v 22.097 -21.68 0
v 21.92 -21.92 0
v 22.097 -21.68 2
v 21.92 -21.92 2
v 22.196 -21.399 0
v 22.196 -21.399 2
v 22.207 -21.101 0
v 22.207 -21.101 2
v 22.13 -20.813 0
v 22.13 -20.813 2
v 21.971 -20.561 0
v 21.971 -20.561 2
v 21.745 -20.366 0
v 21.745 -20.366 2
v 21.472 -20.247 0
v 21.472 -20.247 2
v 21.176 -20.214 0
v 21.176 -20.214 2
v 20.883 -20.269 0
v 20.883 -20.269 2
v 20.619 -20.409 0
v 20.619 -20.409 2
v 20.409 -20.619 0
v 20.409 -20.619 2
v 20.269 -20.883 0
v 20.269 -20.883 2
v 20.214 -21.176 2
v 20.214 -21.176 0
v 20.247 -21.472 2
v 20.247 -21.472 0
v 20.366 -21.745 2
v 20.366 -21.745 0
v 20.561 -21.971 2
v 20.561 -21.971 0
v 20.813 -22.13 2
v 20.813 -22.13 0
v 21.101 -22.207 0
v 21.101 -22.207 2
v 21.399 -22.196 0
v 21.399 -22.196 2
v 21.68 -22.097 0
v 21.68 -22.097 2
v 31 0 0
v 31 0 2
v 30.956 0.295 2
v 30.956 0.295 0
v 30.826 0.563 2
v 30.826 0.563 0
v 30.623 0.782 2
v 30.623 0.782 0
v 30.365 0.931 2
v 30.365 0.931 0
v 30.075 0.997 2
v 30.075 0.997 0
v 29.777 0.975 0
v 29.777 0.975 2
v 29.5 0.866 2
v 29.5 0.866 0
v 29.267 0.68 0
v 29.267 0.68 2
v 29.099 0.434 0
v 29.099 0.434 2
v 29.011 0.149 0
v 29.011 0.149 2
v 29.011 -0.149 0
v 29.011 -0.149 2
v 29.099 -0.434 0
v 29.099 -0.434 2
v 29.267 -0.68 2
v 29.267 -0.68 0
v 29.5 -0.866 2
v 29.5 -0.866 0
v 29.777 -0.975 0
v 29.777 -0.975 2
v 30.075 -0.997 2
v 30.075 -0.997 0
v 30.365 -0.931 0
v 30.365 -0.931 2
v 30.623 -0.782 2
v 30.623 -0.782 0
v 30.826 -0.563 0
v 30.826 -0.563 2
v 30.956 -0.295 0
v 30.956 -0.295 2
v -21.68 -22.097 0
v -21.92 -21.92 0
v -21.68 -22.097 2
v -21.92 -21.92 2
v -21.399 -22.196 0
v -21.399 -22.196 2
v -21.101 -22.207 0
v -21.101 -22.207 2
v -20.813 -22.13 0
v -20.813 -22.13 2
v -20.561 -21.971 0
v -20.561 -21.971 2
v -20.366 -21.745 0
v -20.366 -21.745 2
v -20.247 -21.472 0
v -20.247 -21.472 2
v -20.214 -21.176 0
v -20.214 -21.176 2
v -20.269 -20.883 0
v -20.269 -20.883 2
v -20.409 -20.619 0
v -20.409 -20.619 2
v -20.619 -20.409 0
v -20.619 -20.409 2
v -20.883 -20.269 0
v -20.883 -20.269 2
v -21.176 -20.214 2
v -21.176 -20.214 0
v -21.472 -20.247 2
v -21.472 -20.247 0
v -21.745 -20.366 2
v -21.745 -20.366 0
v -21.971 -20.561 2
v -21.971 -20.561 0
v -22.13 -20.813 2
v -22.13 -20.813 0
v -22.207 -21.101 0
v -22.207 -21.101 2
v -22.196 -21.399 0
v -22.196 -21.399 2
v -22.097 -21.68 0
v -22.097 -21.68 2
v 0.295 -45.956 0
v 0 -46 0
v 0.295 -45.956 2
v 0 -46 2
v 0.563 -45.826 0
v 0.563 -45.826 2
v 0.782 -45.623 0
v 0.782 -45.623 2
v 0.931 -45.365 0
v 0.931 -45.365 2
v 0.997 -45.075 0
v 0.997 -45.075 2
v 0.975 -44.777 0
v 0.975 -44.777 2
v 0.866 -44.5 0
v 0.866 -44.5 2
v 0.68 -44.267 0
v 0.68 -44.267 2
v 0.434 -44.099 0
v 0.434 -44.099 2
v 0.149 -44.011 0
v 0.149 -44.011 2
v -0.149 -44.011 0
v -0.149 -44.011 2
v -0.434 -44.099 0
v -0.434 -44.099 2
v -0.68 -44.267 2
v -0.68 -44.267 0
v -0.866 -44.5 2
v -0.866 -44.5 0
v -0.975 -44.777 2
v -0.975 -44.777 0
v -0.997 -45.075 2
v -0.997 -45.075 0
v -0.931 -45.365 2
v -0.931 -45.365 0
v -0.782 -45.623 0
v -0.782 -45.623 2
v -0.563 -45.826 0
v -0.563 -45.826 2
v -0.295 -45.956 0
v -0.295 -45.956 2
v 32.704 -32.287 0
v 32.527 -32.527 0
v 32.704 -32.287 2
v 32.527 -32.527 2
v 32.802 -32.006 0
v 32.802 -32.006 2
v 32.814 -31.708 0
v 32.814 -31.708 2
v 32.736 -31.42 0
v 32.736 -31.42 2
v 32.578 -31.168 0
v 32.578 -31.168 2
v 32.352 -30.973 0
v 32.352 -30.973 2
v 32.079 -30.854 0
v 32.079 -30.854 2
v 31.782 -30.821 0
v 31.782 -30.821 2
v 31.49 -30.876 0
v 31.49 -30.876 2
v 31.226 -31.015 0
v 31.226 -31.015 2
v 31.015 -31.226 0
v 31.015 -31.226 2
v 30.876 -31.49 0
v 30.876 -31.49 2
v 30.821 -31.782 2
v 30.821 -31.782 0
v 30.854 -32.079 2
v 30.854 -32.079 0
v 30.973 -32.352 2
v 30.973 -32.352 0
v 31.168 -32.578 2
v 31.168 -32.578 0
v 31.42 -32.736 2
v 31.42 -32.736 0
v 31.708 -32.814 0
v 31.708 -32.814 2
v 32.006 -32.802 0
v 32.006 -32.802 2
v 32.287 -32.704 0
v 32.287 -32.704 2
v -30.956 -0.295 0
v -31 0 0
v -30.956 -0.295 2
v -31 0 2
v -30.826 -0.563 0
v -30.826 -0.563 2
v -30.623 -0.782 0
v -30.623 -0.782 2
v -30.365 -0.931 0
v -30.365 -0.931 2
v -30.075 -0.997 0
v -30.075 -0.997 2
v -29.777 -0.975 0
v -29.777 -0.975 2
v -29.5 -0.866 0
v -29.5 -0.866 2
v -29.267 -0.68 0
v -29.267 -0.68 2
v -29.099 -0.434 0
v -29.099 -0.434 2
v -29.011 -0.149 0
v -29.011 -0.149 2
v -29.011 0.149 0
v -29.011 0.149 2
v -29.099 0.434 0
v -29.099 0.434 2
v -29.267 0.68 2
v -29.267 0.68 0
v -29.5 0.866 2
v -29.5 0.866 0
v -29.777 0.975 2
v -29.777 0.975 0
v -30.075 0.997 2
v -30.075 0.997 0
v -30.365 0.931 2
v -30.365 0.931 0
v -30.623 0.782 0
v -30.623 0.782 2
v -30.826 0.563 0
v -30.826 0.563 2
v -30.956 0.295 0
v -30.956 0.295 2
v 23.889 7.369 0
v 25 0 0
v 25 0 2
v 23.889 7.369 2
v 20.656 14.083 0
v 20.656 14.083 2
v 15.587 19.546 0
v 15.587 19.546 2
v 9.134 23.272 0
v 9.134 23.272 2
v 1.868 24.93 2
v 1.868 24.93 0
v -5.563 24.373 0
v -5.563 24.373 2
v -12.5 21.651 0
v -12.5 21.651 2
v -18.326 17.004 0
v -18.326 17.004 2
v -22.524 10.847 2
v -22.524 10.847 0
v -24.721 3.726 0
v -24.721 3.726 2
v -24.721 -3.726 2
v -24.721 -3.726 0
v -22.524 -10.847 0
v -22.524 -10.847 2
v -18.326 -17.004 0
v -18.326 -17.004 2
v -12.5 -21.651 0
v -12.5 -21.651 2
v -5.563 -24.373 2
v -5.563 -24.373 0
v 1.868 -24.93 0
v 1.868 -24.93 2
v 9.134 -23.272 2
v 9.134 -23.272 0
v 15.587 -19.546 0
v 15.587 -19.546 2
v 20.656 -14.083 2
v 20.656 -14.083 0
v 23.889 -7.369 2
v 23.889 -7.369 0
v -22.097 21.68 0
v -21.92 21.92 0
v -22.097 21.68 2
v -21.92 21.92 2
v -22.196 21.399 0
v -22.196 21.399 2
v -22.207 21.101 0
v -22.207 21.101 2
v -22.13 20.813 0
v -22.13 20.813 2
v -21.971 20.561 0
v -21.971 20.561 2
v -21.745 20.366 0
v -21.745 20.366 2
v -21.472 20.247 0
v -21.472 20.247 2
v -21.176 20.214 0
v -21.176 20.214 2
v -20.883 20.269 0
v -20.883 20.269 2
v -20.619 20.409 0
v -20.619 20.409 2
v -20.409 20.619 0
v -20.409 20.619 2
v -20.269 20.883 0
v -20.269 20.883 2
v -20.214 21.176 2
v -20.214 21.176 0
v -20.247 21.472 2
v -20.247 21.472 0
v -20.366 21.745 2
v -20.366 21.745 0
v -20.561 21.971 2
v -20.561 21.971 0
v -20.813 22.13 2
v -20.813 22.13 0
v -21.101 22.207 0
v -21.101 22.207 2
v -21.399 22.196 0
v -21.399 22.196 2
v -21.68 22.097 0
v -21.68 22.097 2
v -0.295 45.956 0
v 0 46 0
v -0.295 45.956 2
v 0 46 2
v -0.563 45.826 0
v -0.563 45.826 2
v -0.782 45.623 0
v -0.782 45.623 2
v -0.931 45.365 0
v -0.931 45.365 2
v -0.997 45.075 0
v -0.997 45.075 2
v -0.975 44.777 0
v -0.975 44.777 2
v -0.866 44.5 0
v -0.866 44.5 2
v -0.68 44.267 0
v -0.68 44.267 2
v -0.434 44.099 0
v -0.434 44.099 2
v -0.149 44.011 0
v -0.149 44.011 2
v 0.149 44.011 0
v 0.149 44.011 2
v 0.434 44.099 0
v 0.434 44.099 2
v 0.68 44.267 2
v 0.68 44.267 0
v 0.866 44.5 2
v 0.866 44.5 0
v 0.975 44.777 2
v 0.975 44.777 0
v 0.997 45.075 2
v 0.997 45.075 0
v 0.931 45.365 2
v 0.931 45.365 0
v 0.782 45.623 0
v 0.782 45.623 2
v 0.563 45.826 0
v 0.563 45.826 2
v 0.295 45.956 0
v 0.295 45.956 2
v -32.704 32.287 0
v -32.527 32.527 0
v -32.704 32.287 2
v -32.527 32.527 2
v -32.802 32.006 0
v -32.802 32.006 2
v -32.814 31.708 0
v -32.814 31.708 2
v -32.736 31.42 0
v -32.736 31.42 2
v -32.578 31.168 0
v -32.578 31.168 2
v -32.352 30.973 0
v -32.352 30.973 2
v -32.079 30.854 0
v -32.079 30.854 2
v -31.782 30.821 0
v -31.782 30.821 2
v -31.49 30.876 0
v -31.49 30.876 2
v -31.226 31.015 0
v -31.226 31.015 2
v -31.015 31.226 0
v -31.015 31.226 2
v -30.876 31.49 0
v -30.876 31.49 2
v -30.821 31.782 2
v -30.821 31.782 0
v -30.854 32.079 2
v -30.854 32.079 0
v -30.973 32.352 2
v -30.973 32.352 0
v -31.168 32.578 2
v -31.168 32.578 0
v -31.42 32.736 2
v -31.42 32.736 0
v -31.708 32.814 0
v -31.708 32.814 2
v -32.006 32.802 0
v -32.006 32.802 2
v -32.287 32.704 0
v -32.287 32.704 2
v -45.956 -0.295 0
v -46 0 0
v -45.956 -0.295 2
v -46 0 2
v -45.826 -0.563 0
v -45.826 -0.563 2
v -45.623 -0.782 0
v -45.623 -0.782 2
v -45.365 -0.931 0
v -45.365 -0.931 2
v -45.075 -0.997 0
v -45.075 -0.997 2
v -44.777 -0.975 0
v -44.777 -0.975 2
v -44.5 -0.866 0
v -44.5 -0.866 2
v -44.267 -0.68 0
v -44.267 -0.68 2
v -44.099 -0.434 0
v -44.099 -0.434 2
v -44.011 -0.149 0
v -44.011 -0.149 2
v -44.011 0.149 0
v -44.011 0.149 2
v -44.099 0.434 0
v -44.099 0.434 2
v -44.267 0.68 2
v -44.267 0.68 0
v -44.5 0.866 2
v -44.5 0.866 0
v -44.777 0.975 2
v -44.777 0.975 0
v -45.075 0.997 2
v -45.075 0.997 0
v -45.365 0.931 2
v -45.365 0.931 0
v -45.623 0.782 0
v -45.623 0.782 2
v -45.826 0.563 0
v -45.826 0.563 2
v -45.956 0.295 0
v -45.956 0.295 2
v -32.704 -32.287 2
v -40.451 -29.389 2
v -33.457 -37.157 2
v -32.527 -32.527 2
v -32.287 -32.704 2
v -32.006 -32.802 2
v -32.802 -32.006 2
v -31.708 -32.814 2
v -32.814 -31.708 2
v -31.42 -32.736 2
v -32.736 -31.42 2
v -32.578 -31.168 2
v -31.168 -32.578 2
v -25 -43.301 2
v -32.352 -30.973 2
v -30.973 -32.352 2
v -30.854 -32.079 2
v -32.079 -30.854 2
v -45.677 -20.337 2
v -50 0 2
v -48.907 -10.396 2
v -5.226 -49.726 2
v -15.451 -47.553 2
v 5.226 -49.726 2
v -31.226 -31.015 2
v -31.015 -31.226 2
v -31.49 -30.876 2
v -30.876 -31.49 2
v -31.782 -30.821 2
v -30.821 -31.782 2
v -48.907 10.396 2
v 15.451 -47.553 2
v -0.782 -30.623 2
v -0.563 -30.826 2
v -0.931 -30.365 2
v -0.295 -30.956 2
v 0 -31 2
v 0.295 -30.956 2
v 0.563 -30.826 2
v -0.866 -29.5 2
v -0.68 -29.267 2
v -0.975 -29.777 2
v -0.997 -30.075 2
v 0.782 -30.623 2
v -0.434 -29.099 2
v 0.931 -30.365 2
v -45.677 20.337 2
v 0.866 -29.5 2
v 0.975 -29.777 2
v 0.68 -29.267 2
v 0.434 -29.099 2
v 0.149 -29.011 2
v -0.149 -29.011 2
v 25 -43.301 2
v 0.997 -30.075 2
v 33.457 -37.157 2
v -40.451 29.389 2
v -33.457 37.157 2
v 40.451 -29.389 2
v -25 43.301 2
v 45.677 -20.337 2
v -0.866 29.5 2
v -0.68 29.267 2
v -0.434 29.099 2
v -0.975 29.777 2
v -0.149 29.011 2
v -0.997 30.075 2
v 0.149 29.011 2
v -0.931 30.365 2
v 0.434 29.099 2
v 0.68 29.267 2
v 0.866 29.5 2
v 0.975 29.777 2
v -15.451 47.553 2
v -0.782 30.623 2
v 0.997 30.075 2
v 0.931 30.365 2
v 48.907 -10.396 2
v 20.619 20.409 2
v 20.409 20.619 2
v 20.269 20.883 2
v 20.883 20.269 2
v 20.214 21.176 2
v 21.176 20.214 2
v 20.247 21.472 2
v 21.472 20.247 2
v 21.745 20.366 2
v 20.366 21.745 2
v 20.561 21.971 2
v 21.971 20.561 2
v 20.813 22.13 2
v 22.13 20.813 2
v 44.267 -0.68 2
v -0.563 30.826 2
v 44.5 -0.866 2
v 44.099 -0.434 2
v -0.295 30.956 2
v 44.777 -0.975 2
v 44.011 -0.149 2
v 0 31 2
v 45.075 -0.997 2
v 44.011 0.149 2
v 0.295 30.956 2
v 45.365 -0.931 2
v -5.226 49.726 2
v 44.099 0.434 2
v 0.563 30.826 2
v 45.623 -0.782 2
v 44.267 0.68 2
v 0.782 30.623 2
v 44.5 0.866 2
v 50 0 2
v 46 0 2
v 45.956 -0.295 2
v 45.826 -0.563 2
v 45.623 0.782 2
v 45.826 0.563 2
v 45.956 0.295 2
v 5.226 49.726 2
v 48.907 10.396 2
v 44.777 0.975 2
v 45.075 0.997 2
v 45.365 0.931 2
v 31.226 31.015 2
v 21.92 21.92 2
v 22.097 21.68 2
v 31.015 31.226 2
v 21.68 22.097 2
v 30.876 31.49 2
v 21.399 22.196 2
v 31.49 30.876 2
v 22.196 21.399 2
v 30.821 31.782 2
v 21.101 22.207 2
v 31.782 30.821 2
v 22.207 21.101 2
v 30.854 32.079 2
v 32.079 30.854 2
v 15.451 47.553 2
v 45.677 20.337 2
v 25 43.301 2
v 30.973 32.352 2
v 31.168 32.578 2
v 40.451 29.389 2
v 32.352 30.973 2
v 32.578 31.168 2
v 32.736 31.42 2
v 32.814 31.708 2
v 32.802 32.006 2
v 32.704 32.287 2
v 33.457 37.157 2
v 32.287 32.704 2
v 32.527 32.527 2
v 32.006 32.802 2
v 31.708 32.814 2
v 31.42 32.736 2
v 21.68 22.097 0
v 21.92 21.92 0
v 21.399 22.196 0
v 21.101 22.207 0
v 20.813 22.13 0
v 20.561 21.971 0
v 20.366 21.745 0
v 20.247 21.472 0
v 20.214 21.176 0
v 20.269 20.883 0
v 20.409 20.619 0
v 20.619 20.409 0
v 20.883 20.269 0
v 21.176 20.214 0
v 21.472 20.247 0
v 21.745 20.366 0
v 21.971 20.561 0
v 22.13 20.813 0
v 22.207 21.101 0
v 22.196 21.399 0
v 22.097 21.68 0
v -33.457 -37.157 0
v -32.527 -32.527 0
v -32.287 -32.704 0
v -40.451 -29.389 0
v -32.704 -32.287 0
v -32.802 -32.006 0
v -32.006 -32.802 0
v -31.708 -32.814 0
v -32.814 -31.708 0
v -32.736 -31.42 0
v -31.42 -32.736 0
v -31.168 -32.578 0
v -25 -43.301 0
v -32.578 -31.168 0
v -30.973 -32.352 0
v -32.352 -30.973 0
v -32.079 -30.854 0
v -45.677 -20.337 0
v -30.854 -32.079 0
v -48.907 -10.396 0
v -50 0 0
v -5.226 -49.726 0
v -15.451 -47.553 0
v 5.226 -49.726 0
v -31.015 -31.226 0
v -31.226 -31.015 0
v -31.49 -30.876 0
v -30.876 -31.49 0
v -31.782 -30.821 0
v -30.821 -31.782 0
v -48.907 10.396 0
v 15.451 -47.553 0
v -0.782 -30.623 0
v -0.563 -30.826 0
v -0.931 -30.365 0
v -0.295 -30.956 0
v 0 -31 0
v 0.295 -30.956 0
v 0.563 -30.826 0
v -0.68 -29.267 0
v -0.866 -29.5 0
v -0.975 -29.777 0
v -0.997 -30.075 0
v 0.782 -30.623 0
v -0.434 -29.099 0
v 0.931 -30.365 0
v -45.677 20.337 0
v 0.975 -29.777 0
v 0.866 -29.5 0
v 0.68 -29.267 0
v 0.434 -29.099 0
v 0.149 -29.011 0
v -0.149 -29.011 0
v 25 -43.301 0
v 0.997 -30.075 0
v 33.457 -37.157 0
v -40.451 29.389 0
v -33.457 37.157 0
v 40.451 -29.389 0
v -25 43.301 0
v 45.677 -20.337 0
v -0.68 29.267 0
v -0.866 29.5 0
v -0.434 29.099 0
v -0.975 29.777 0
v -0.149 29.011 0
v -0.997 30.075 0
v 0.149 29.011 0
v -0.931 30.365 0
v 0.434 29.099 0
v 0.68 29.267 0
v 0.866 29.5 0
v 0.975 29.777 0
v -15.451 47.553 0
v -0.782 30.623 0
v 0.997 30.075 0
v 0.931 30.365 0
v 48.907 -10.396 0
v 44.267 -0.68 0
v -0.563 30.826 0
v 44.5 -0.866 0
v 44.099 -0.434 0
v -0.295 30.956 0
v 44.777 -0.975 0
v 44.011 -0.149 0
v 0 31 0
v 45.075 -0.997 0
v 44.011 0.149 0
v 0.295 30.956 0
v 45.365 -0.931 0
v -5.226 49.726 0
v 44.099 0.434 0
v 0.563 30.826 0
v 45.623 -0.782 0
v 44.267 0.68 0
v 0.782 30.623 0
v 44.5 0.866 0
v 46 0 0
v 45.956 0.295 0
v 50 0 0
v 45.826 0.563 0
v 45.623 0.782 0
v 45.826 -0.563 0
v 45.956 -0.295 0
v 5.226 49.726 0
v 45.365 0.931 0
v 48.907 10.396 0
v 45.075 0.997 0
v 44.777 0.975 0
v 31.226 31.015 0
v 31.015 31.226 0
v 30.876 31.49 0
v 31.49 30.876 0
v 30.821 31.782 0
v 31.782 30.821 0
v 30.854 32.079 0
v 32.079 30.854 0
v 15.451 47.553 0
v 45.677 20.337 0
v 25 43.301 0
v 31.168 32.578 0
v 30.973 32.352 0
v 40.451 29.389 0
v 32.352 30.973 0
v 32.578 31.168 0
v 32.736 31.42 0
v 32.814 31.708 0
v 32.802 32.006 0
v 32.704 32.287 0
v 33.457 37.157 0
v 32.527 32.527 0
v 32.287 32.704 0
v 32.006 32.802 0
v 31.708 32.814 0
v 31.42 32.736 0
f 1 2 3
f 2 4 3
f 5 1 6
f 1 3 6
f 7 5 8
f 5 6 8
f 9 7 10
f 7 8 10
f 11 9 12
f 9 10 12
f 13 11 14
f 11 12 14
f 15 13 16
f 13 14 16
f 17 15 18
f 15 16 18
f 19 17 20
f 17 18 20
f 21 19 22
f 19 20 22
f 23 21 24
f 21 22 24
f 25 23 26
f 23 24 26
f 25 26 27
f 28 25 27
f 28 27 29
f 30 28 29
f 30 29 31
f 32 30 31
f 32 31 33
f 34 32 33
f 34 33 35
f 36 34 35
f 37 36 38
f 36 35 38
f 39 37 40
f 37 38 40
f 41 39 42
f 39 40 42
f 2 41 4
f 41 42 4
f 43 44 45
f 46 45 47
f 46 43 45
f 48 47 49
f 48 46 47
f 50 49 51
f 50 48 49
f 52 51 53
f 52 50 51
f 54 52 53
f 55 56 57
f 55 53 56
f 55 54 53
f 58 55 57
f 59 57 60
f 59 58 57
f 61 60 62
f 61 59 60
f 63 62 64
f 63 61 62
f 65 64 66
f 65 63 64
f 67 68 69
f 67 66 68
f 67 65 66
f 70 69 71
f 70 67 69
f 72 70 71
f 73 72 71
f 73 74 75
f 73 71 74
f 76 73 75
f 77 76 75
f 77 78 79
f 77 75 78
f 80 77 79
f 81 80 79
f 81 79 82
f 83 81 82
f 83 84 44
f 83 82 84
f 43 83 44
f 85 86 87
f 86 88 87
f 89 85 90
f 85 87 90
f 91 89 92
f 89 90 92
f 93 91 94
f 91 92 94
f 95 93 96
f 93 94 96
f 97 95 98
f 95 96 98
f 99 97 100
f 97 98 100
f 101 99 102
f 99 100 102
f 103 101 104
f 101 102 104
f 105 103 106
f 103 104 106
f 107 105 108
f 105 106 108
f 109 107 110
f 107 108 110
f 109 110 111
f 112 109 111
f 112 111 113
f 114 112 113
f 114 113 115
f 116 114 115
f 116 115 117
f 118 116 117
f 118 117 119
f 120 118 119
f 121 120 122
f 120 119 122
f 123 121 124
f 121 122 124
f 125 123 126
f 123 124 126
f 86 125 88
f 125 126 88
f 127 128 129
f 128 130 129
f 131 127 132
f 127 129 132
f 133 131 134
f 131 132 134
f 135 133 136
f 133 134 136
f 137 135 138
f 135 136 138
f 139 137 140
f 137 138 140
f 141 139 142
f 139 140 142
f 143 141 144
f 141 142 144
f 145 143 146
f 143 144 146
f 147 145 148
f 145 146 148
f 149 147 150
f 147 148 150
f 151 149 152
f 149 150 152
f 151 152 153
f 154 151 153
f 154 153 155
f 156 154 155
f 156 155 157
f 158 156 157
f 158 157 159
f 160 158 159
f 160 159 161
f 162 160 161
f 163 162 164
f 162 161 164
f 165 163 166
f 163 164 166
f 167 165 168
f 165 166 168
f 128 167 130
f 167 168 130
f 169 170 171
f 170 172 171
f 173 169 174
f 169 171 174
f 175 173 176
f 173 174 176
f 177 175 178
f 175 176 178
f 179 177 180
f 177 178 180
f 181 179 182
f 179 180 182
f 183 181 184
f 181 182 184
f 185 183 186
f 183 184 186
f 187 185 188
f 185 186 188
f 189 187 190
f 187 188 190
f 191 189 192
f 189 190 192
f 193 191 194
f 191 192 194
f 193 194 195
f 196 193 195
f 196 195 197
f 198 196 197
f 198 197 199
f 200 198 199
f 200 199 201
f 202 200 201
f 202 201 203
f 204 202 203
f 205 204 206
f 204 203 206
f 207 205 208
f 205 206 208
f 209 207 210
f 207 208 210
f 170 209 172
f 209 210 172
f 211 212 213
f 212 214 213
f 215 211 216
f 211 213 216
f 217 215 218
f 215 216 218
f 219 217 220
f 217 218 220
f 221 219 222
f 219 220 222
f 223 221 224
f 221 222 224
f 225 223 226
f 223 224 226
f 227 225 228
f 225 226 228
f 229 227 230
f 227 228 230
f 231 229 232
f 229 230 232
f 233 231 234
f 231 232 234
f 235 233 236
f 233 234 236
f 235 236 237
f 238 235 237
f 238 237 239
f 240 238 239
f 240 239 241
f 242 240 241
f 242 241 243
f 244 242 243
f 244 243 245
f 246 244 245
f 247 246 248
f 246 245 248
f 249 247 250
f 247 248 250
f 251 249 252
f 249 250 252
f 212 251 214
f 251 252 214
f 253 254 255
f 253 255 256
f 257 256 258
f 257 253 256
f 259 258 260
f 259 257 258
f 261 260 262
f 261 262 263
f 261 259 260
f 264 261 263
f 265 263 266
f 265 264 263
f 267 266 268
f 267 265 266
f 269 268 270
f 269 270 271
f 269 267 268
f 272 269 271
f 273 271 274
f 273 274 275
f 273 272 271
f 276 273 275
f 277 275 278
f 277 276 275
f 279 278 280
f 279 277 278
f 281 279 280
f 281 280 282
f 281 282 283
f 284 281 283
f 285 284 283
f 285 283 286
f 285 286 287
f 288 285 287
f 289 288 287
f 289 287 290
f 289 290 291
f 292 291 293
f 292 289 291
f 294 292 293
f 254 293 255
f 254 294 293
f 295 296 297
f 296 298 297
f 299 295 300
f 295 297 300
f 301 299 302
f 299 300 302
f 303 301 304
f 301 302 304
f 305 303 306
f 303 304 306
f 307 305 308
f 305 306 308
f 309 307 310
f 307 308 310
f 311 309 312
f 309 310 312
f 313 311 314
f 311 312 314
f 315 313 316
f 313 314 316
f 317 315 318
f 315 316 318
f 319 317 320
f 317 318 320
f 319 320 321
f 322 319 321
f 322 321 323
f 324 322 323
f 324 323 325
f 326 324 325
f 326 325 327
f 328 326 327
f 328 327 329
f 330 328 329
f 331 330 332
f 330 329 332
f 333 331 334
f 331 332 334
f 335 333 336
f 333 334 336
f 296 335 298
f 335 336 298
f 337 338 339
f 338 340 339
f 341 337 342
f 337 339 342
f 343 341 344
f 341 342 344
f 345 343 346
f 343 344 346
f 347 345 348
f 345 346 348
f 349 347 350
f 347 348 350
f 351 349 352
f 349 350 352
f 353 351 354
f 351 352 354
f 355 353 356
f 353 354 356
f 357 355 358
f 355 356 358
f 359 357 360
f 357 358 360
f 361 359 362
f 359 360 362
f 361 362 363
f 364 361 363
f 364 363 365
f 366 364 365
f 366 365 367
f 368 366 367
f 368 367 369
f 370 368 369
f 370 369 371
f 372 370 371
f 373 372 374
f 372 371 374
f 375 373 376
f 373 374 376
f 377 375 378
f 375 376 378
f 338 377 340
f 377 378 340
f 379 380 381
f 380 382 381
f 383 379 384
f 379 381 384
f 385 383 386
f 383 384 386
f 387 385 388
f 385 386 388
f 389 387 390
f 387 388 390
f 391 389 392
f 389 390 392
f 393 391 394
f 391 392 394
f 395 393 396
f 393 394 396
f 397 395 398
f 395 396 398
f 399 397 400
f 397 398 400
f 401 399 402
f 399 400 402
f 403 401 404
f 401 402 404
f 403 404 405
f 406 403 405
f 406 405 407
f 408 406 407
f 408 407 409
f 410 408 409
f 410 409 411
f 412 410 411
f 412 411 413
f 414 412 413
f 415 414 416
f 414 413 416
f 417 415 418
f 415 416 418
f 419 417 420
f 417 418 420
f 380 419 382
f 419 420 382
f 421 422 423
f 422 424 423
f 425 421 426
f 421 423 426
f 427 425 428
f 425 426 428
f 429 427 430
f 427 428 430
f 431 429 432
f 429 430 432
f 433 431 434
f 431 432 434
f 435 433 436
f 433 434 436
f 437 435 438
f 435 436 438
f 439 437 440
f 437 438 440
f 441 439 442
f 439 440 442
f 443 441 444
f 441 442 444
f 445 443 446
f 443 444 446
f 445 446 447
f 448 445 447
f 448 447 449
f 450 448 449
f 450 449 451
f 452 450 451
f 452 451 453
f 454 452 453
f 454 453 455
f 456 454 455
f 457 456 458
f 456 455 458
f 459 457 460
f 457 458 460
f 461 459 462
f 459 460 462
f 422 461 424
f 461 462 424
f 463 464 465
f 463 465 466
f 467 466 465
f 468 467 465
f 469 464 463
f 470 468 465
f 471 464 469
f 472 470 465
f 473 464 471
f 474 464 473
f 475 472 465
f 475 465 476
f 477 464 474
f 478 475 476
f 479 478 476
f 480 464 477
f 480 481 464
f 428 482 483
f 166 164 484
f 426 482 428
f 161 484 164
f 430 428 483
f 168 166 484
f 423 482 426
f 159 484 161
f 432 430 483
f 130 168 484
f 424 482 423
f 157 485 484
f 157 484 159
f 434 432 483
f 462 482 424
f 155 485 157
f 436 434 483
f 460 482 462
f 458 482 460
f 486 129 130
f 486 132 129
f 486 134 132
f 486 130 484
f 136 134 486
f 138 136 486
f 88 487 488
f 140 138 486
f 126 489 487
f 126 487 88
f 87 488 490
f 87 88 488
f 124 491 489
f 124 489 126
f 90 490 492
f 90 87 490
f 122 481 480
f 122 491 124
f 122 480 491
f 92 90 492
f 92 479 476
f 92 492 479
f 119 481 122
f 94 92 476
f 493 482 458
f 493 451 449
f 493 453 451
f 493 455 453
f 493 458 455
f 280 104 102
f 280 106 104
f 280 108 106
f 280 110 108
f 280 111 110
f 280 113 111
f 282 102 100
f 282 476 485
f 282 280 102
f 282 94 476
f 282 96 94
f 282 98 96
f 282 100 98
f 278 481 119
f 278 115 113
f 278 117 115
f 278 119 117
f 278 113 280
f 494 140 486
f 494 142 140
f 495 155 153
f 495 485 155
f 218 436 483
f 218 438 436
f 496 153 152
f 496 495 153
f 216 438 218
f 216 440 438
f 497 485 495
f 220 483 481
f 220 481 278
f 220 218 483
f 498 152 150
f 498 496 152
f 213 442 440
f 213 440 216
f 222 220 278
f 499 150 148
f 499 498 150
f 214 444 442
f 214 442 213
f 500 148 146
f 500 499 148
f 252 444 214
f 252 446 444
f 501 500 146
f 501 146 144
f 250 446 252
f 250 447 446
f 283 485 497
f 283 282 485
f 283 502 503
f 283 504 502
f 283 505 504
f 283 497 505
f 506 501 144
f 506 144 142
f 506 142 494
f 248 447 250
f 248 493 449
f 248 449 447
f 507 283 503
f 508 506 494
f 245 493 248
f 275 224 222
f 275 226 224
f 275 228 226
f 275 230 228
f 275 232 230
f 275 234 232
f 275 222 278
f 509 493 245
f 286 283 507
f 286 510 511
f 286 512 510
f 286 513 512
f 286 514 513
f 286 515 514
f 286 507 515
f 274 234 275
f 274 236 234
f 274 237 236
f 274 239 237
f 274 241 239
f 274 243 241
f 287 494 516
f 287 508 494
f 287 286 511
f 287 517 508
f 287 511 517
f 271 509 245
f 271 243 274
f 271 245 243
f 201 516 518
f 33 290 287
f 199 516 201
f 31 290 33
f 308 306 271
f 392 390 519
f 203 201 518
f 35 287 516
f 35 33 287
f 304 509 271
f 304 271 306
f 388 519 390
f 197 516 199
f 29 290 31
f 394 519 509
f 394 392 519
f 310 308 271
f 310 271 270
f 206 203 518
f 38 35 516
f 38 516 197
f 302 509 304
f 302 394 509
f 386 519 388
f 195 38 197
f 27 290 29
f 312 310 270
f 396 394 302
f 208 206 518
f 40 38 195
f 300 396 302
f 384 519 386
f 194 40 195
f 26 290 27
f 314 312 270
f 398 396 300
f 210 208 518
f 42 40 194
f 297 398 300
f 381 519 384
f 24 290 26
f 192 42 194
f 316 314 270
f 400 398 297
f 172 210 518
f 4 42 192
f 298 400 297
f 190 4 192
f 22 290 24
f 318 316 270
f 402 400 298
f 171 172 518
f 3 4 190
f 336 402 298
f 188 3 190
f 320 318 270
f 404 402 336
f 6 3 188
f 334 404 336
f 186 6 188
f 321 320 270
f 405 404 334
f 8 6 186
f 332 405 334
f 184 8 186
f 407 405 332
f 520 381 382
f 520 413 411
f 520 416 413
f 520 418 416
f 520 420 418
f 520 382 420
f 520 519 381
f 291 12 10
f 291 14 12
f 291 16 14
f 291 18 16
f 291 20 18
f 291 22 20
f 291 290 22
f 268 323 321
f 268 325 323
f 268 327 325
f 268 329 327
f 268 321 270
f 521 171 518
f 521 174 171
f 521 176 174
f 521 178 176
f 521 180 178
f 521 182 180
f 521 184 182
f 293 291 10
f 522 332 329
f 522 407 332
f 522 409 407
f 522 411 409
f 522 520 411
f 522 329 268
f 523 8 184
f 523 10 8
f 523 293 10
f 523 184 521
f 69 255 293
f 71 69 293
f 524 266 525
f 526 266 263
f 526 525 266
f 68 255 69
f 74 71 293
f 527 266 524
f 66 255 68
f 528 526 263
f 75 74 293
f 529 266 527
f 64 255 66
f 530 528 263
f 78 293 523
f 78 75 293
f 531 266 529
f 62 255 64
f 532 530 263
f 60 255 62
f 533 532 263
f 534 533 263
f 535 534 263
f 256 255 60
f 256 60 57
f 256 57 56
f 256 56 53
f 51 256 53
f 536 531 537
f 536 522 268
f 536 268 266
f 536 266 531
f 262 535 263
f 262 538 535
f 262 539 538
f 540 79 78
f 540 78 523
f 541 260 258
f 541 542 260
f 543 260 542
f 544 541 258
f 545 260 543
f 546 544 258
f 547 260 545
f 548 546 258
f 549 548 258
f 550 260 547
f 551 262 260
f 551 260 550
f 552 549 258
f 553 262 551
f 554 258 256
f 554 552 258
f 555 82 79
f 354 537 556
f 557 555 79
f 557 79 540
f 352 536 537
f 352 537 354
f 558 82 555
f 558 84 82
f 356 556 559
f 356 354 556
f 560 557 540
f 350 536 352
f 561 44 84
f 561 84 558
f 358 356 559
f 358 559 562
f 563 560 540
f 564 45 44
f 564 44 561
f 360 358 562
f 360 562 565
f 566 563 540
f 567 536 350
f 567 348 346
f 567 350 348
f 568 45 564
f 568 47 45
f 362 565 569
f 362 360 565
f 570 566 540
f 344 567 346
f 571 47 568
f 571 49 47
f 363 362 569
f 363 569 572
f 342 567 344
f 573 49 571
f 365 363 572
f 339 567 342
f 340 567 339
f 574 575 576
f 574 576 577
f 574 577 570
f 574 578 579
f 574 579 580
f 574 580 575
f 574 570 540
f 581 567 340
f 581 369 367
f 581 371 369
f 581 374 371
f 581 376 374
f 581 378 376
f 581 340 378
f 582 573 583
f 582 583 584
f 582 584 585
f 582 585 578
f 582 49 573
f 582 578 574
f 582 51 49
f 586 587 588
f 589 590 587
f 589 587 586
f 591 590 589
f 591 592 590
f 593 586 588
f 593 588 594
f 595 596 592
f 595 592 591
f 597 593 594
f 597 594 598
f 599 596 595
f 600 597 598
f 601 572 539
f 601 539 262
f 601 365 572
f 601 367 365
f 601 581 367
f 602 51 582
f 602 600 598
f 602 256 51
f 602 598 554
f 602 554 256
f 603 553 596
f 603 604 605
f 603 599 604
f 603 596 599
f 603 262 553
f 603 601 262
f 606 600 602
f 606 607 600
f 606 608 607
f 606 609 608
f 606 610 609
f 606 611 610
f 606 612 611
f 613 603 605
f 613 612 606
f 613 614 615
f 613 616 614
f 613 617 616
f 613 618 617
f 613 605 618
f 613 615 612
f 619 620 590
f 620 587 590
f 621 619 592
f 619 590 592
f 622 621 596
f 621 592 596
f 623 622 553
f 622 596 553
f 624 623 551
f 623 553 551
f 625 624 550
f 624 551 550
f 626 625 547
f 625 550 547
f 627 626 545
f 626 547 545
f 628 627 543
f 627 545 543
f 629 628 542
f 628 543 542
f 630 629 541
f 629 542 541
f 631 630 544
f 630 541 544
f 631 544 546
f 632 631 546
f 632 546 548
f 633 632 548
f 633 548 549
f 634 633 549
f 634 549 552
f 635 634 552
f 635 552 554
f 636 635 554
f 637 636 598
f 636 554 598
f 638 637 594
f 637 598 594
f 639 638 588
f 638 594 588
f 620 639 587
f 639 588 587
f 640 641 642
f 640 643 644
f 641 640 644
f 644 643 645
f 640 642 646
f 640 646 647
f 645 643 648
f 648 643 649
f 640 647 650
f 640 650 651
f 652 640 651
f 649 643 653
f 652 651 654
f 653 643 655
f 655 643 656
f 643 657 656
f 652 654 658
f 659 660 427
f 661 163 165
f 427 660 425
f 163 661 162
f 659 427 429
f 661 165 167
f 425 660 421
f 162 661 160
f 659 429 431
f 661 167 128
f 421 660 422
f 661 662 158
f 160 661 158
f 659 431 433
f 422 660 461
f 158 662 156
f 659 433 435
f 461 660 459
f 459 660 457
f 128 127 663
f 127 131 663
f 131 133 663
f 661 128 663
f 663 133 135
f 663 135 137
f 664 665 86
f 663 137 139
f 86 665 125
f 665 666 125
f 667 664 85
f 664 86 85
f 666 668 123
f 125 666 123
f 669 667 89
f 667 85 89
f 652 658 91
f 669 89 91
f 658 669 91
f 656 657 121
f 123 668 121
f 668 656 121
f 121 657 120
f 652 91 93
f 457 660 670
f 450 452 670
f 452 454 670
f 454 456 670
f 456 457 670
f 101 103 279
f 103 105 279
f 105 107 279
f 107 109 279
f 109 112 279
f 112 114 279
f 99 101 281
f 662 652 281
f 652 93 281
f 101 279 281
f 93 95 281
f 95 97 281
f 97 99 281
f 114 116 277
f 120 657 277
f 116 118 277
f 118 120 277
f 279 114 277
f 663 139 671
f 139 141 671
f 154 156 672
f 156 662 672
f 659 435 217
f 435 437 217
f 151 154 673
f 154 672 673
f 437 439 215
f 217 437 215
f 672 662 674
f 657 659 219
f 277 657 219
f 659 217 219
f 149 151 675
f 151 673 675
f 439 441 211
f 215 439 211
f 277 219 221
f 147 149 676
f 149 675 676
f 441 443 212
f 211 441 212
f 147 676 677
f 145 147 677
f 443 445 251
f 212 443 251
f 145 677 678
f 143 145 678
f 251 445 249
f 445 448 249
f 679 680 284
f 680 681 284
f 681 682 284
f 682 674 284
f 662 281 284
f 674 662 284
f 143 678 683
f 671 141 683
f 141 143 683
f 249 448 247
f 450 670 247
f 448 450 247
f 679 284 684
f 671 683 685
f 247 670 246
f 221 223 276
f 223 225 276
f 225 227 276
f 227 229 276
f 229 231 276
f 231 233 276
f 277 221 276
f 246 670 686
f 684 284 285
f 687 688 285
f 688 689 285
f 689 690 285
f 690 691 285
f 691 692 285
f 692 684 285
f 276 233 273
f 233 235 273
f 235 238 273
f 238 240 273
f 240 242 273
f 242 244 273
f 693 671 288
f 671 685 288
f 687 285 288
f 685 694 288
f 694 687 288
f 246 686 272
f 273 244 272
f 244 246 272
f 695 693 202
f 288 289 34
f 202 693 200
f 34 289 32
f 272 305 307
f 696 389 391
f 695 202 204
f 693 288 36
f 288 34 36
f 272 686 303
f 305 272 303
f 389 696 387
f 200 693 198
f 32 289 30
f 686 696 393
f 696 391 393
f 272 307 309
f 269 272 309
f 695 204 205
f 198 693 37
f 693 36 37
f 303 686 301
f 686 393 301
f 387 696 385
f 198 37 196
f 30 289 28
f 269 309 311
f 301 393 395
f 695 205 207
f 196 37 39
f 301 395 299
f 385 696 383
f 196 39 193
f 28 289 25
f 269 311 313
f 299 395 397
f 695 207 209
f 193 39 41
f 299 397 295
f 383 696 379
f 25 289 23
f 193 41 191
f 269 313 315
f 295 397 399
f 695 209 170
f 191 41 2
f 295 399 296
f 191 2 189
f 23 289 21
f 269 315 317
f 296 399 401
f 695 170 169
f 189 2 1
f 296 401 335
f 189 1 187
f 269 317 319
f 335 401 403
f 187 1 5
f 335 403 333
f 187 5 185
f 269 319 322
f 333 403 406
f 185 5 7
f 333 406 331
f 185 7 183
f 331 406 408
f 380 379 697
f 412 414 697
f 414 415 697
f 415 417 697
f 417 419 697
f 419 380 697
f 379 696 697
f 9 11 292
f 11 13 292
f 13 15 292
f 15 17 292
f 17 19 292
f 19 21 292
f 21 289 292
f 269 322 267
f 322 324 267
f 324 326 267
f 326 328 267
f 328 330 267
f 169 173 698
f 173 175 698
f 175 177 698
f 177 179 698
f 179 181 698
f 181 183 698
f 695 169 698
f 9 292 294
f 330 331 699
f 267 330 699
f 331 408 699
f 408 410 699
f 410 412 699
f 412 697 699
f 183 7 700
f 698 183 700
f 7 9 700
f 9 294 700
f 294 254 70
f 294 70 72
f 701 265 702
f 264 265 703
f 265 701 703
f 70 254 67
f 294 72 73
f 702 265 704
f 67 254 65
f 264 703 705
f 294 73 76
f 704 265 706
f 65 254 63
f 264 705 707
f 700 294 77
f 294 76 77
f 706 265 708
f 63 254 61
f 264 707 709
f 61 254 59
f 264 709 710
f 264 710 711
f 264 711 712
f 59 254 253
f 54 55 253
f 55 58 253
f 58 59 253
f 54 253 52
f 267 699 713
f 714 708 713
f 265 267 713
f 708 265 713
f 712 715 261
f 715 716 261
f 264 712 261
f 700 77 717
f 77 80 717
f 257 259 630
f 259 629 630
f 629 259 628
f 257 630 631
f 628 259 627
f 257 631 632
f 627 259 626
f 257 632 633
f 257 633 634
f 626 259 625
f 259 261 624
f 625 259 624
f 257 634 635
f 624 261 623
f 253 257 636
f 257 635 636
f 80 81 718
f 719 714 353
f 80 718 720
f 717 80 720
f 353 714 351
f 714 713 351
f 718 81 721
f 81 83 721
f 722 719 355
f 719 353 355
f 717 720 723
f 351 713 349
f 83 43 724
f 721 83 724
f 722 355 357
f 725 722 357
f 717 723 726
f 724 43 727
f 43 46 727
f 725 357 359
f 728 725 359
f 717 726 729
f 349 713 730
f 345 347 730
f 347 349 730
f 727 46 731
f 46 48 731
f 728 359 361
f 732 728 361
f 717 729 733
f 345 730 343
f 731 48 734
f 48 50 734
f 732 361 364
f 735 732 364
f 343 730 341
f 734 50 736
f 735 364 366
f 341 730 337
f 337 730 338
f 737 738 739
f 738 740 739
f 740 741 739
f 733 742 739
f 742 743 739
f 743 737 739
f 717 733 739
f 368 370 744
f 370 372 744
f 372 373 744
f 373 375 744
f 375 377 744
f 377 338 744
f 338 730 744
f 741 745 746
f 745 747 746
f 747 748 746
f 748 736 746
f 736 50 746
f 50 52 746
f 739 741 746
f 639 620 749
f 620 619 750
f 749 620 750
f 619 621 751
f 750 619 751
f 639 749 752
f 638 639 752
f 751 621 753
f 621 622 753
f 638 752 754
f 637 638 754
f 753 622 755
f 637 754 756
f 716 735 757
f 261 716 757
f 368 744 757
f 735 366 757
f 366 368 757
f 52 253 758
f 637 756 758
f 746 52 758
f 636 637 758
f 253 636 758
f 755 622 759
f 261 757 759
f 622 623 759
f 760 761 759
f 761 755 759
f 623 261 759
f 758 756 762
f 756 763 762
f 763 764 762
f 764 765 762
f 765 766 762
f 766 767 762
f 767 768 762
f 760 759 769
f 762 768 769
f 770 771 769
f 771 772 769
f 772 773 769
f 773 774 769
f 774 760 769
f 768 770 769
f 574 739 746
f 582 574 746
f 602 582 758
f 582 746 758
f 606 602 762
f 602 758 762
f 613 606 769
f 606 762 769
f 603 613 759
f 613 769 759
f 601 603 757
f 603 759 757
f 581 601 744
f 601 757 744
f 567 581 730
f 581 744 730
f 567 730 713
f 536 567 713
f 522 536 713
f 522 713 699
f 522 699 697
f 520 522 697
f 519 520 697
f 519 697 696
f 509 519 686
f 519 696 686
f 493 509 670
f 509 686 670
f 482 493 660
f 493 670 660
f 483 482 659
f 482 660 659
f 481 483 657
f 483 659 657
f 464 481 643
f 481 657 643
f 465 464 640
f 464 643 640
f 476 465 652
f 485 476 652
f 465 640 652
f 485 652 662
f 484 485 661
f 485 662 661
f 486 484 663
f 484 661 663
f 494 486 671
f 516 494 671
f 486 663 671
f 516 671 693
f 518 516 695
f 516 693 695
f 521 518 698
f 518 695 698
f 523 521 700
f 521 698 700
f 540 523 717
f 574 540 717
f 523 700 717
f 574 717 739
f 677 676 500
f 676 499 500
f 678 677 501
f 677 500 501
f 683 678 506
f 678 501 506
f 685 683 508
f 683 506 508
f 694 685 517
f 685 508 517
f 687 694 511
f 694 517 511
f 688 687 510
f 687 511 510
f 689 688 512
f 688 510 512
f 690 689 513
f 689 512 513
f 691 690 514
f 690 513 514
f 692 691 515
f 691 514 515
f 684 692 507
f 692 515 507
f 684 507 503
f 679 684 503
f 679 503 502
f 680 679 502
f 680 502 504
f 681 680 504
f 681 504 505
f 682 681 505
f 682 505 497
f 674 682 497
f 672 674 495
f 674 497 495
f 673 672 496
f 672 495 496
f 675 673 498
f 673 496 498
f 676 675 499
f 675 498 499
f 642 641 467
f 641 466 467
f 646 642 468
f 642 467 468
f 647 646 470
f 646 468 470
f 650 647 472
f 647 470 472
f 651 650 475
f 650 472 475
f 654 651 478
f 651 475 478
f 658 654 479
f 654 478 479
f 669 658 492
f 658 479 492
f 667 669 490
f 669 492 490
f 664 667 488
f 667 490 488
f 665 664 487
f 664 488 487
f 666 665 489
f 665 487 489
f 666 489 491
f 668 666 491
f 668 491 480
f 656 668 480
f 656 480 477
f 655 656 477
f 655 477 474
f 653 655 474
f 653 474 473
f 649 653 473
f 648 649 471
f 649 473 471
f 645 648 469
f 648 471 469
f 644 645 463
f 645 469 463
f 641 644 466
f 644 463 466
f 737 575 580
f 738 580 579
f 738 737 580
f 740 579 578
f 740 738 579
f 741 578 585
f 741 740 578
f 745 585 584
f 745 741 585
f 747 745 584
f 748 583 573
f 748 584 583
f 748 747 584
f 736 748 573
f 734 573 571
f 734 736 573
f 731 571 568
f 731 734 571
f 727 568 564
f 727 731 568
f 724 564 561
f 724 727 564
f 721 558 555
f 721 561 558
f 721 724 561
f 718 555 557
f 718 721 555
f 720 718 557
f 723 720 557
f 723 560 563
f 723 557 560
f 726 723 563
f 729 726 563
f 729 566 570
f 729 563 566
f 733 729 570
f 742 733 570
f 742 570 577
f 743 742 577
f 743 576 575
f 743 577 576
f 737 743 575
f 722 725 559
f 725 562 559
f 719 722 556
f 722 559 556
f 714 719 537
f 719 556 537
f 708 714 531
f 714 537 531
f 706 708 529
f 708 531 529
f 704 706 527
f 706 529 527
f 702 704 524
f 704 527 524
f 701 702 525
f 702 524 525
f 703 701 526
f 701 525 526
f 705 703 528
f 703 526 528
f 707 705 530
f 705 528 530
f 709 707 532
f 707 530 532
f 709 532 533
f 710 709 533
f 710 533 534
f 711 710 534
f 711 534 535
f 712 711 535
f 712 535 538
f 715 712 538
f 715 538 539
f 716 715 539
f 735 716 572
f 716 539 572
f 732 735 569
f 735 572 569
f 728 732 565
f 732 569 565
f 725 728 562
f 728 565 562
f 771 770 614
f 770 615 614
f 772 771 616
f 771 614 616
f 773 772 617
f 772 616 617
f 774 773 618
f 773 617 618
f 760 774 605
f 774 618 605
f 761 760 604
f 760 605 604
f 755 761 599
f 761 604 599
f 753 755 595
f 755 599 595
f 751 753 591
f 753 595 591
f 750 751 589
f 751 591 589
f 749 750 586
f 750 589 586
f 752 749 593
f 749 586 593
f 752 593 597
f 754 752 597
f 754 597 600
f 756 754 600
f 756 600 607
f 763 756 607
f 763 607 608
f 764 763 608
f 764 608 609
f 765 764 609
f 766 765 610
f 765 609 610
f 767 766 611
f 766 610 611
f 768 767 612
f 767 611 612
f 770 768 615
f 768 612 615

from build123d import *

# Parameters (mm, degrees)
SKETCH_R           = 50
SKETCH_R_2         = 25
PAD_DEPTH          = 2
SKETCH001_R        = 1
POCKET_DEPTH       = 282.871995
POCKET_DEPTH_BACK  = 284.871995
POLARPATTERN_COUNT = 8


with BuildPart() as part:
    # Sketch → Pad (new body)
    with BuildSketch(Plane.XY):
        Circle(SKETCH_R)
        Circle(SKETCH_R_2, mode=Mode.SUBTRACT)
    extrude(amount=PAD_DEPTH)

    # Sketch001 → Pocket (cut, two sides)
    with BuildSketch(Plane.XY) as pocket_sk:
        with Locations((30, 0)):
            Circle(SKETCH001_R)
        with Locations((45, 0)):
            Circle(SKETCH001_R)
    pocket = extrude(amount=-POCKET_DEPTH, mode=Mode.SUBTRACT) + extrude(pocket_sk.sketch, amount=POCKET_DEPTH_BACK, mode=Mode.SUBTRACT)

    # PolarPattern: Pocket ×8 about axis
    polarpattern_axis = Axis((0, 0, 0), (0, 0, 1))
    for i in range(1, POLARPATTERN_COUNT):
        add(pocket.rotate(polarpattern_axis, i * 360 / POLARPATTERN_COUNT), mode=Mode.SUBTRACT)


solid = part.part
